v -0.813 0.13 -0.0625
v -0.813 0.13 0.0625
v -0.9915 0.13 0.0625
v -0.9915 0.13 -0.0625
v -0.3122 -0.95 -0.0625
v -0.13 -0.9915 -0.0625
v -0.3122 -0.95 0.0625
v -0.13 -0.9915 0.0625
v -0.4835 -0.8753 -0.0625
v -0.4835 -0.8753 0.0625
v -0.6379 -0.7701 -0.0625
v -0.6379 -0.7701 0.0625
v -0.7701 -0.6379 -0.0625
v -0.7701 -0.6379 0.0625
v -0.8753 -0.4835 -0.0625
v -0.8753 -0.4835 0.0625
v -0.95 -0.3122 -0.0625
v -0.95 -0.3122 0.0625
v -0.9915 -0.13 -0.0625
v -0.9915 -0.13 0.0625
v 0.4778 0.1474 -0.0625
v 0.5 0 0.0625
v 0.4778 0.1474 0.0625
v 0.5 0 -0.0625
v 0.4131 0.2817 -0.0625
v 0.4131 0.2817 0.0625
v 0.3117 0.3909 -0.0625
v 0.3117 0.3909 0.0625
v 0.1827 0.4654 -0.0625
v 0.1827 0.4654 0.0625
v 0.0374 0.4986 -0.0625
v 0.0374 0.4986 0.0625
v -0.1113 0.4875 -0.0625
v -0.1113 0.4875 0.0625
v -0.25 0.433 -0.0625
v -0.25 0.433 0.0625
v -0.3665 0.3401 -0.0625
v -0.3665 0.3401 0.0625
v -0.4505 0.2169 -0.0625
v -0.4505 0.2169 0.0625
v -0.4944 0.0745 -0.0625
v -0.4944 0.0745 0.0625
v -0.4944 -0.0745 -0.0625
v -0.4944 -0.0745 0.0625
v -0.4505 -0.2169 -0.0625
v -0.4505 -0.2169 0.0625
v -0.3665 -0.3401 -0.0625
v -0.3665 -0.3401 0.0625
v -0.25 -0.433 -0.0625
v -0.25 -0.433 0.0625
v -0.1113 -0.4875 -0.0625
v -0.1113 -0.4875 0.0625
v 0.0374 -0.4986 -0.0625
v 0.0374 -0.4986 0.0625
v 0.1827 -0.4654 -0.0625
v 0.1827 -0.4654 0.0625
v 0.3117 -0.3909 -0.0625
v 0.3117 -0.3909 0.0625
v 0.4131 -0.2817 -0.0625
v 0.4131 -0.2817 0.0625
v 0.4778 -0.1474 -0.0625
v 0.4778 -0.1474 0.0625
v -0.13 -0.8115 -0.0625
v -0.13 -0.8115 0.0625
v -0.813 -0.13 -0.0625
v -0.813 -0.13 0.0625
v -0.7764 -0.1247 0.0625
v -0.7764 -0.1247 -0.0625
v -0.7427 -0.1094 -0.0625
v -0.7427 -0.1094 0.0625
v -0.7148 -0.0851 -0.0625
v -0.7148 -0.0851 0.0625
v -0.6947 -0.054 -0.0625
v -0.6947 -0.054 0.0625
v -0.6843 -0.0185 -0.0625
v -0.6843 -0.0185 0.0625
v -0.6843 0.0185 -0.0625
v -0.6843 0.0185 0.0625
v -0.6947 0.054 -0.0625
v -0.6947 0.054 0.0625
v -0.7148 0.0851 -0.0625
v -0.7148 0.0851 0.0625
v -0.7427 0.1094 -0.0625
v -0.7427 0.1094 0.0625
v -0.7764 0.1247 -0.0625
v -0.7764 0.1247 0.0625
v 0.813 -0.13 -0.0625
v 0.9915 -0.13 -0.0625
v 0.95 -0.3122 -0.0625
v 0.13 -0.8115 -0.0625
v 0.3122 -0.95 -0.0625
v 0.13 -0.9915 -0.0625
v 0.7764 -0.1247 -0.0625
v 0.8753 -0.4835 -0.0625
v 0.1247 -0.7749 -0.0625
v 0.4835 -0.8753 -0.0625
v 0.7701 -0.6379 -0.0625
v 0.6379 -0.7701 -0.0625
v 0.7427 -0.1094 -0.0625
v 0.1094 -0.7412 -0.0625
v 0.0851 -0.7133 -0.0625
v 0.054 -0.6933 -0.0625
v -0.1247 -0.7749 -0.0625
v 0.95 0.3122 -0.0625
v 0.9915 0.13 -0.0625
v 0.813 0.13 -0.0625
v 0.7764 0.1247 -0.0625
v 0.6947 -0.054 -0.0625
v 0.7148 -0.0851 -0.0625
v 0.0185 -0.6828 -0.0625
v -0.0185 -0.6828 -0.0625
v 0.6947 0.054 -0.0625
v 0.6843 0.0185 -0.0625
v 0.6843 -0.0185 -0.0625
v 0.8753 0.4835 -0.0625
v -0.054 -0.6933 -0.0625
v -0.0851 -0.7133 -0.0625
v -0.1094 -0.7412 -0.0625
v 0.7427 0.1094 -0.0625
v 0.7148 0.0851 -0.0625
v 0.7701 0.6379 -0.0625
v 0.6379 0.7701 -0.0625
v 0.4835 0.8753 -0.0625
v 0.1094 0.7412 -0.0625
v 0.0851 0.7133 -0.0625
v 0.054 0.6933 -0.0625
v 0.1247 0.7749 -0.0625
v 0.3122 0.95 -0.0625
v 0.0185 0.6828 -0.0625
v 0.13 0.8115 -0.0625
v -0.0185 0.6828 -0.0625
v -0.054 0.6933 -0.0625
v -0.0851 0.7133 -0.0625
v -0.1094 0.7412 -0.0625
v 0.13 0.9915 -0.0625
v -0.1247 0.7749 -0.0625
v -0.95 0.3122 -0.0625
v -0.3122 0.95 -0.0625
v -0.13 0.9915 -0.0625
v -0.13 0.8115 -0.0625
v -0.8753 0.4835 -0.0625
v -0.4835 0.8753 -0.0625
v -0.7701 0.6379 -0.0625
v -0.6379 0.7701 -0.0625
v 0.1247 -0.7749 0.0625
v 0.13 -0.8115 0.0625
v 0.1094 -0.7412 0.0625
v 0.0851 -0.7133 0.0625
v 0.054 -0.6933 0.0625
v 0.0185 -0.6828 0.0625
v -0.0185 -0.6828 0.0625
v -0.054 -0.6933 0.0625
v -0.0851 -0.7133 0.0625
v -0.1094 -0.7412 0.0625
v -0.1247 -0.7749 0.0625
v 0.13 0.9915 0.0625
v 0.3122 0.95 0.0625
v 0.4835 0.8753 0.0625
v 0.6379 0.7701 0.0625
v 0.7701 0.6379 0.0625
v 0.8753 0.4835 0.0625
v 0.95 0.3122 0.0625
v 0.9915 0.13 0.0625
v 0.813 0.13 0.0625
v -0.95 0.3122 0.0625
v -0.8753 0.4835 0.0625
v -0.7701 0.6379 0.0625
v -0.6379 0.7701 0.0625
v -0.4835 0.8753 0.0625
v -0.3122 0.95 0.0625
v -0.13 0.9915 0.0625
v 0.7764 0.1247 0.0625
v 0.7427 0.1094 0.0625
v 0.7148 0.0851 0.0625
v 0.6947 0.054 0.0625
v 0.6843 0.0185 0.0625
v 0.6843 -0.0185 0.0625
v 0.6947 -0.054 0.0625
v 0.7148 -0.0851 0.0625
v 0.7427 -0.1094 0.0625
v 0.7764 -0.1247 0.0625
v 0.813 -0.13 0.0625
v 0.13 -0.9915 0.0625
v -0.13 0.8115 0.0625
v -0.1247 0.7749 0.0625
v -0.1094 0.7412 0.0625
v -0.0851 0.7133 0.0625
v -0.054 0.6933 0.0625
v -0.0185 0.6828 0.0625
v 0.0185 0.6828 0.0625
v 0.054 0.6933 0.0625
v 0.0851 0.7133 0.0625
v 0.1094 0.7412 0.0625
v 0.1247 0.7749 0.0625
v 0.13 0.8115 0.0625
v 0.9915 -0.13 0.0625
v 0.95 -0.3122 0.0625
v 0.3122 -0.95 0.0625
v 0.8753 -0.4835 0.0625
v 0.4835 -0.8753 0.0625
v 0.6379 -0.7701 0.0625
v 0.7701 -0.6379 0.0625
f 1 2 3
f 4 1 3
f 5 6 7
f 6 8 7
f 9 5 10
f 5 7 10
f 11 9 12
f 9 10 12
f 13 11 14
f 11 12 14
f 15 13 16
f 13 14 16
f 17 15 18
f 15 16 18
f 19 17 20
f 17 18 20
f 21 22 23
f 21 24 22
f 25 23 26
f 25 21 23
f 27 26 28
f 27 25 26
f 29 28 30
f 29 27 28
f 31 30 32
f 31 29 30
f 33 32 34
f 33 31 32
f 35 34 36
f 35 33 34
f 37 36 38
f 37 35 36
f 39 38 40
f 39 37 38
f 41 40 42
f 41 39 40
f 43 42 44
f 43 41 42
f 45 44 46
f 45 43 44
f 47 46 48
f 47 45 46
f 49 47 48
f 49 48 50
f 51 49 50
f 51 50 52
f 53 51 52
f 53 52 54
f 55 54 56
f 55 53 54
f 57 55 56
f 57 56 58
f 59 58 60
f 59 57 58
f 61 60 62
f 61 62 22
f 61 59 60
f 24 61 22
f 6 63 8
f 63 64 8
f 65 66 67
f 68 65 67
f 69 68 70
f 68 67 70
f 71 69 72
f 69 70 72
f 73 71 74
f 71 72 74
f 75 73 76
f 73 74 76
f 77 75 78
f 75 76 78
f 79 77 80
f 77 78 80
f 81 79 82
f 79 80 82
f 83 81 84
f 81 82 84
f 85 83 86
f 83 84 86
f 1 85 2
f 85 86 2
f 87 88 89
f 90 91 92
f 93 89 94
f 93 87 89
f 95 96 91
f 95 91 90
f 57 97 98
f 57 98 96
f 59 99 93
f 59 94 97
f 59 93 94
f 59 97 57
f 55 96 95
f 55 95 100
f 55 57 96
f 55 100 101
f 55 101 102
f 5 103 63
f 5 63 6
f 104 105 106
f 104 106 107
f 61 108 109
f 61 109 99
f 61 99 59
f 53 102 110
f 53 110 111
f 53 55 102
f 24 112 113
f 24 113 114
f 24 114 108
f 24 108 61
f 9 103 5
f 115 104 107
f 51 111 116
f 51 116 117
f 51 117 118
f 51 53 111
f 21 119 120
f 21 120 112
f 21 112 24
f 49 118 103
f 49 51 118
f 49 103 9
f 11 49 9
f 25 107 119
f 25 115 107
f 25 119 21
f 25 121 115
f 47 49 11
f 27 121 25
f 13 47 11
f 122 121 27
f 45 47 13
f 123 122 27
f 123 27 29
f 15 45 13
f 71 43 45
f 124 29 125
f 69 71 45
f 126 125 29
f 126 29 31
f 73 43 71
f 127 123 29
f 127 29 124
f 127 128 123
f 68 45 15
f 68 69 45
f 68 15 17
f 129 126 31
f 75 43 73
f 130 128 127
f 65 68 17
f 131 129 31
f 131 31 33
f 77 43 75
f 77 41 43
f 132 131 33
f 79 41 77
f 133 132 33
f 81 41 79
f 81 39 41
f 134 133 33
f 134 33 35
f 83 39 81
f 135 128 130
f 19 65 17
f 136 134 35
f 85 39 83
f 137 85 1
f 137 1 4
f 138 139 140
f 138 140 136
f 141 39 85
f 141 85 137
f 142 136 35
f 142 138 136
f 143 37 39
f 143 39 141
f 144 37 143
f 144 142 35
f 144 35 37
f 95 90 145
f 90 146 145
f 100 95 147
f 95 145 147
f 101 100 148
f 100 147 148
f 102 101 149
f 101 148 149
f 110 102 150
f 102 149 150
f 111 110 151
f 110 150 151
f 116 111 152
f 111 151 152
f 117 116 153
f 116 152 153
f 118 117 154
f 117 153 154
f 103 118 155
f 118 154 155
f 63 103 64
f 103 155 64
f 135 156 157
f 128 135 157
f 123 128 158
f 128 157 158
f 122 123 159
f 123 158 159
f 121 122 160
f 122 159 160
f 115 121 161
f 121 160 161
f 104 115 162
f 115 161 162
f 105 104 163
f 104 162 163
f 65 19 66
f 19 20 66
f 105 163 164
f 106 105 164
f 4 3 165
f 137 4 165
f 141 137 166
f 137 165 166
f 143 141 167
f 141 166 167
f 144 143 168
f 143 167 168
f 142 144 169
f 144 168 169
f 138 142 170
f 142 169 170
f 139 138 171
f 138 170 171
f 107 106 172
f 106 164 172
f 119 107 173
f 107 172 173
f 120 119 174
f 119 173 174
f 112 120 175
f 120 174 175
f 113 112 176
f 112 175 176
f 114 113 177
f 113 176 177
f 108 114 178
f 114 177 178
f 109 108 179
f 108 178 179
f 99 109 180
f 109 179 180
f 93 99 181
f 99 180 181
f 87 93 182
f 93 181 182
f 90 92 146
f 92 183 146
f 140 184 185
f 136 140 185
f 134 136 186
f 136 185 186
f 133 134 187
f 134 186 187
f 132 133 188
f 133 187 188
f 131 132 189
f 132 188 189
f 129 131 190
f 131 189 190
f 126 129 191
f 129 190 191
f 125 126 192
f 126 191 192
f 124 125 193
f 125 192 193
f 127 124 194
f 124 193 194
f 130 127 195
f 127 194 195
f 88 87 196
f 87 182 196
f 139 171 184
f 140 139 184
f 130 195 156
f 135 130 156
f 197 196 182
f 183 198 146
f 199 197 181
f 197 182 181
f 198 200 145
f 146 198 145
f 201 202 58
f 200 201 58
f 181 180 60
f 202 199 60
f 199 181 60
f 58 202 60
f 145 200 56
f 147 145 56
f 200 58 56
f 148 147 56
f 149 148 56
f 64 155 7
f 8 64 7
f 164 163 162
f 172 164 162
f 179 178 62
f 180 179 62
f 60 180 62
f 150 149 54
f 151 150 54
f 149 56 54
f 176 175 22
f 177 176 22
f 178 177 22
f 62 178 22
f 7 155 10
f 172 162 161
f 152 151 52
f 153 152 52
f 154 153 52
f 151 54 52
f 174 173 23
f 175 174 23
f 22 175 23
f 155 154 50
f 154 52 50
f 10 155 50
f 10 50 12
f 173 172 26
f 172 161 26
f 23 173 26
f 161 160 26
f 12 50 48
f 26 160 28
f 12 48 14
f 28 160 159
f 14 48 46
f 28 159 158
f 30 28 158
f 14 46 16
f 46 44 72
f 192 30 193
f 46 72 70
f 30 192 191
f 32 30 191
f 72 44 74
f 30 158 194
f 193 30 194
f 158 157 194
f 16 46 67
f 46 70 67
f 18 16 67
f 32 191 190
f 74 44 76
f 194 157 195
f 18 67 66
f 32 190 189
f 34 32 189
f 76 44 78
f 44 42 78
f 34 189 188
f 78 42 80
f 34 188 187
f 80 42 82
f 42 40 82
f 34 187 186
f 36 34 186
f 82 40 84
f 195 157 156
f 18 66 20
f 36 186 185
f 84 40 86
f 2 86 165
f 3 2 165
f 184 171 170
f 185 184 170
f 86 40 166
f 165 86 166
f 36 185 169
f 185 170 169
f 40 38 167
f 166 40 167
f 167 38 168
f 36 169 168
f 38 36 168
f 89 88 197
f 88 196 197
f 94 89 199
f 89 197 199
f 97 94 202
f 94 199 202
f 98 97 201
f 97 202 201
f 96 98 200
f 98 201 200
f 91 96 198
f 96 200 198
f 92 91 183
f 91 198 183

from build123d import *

# Parameters (mm, degrees)
SKETCH1_R           = 0.5
BOSS_EXTRUDE1_DEPTH = 0.0625


with BuildPart() as part:
    # Sketch1 → Boss-Extrude1 (new, symmetric)
    with BuildSketch(Plane.XY):
        with BuildLine():
            Line((0.991513994, 0.13), (0.813, 0.13))
            ThreePointArc((0.813, 0.13), (0.683, 0), (0.813, -0.13))
            Line((0.813, -0.13), (0.991513994, -0.13))
            ThreePointArc((0.991513994, -0.13), (0.707106781, -0.707106781), (0.13, -0.991513994))
            Line((0.13, -0.991513994), (0.13, -0.811513994))
            ThreePointArc((0.13, -0.811513994), (0, -0.681513994), (-0.13, -0.811513994))
            Line((-0.13, -0.811513994), (-0.13, -0.991513994))
            ThreePointArc((-0.13, -0.991513994), (-0.707106781, -0.707106781), (-0.991513994, -0.13))
            Line((-0.991513994, -0.13), (-0.813, -0.13))
            ThreePointArc((-0.813, -0.13), (-0.683, 0), (-0.813, 0.13))
            Line((-0.813, 0.13), (-0.991513994, 0.13))
            ThreePointArc((-0.991513994, 0.13), (-0.707106781, 0.707106781), (-0.13, 0.991513994))
            Line((-0.13, 0.991513994), (-0.13, 0.811513994))
            ThreePointArc((-0.13, 0.811513994), (0, 0.681513994), (0.13, 0.811513994))
            Line((0.13, 0.811513994), (0.13, 0.991513994))
            ThreePointArc((0.13, 0.991513994), (0.707106781, 0.707106781), (0.991513994, 0.13))
        make_face()
        Circle(SKETCH1_R, mode=Mode.SUBTRACT)
    extrude(amount=BOSS_EXTRUDE1_DEPTH, both=True)


solid = part.part
